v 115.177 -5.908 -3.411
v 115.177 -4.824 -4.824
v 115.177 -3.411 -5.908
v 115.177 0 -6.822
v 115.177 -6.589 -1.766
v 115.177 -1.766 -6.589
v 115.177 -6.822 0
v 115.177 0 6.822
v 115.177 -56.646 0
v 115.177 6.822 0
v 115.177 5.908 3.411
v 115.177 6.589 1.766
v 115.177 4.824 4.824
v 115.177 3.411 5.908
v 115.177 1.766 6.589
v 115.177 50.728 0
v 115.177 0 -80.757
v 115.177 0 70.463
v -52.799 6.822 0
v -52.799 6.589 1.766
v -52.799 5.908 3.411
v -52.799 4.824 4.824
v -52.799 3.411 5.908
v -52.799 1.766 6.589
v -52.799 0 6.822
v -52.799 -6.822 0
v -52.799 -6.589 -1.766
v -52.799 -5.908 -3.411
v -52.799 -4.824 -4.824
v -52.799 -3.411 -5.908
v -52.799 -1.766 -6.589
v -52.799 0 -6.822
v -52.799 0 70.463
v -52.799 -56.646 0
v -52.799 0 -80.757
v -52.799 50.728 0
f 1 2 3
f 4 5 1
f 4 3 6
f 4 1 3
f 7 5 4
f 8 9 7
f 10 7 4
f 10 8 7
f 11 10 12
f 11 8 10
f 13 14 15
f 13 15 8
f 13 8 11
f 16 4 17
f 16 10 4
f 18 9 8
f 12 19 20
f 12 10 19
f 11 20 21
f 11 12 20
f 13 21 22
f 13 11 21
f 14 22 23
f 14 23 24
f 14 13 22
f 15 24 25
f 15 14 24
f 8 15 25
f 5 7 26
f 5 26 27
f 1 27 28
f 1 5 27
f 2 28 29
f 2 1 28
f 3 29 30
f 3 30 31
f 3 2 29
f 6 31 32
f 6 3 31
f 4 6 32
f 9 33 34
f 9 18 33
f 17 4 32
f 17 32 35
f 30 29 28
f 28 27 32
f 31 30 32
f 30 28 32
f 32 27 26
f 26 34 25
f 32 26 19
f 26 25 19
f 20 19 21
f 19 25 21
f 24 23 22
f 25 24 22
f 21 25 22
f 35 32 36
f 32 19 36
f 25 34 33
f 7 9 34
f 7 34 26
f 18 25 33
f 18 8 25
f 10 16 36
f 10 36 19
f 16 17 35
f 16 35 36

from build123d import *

# Parameters (mm, degrees)
F2_DEPTH      = 115.1771843433
F2_DEPTH_BACK = 52.7988504618


# Not quite as in the source:
# - the program builds the solid bodies; features that only make, move or delete a surface that nothing else refers to are left out


with BuildPart() as f2:
    # F0 (on Right) → F2 (new body, two sides)
    with BuildSketch(Plane.YZ) as f2_sk:
        with BuildLine():
            Line((0, 70.4632103443), (-56.6462948918, 0))
            Line((-56.6462948918, 0), (-6.8218263729, 0))
            ThreePointArc((-6.8218263729, 0), (-4.8237596884, -4.8237596884), (0, -6.8218263729))
            Line((0, -6.8218263729), (0, -80.7569846511))
            Line((0, -80.7569846511), (50.7276728749, 0))
            Line((50.7276728749, 0), (6.8218263729, 0))
            ThreePointArc((6.8218263729, 0), (4.8237596884, 4.8237596884), (0, 6.8218263729))
            Line((0, 6.8218263729), (0, 16.5492296219))
            Line((0, 16.5492296219), (0, 70.4632103443))
        make_face()
    extrude(amount=F2_DEPTH)
    extrude(f2_sk.sketch, amount=-F2_DEPTH_BACK)


solid = f2.part
